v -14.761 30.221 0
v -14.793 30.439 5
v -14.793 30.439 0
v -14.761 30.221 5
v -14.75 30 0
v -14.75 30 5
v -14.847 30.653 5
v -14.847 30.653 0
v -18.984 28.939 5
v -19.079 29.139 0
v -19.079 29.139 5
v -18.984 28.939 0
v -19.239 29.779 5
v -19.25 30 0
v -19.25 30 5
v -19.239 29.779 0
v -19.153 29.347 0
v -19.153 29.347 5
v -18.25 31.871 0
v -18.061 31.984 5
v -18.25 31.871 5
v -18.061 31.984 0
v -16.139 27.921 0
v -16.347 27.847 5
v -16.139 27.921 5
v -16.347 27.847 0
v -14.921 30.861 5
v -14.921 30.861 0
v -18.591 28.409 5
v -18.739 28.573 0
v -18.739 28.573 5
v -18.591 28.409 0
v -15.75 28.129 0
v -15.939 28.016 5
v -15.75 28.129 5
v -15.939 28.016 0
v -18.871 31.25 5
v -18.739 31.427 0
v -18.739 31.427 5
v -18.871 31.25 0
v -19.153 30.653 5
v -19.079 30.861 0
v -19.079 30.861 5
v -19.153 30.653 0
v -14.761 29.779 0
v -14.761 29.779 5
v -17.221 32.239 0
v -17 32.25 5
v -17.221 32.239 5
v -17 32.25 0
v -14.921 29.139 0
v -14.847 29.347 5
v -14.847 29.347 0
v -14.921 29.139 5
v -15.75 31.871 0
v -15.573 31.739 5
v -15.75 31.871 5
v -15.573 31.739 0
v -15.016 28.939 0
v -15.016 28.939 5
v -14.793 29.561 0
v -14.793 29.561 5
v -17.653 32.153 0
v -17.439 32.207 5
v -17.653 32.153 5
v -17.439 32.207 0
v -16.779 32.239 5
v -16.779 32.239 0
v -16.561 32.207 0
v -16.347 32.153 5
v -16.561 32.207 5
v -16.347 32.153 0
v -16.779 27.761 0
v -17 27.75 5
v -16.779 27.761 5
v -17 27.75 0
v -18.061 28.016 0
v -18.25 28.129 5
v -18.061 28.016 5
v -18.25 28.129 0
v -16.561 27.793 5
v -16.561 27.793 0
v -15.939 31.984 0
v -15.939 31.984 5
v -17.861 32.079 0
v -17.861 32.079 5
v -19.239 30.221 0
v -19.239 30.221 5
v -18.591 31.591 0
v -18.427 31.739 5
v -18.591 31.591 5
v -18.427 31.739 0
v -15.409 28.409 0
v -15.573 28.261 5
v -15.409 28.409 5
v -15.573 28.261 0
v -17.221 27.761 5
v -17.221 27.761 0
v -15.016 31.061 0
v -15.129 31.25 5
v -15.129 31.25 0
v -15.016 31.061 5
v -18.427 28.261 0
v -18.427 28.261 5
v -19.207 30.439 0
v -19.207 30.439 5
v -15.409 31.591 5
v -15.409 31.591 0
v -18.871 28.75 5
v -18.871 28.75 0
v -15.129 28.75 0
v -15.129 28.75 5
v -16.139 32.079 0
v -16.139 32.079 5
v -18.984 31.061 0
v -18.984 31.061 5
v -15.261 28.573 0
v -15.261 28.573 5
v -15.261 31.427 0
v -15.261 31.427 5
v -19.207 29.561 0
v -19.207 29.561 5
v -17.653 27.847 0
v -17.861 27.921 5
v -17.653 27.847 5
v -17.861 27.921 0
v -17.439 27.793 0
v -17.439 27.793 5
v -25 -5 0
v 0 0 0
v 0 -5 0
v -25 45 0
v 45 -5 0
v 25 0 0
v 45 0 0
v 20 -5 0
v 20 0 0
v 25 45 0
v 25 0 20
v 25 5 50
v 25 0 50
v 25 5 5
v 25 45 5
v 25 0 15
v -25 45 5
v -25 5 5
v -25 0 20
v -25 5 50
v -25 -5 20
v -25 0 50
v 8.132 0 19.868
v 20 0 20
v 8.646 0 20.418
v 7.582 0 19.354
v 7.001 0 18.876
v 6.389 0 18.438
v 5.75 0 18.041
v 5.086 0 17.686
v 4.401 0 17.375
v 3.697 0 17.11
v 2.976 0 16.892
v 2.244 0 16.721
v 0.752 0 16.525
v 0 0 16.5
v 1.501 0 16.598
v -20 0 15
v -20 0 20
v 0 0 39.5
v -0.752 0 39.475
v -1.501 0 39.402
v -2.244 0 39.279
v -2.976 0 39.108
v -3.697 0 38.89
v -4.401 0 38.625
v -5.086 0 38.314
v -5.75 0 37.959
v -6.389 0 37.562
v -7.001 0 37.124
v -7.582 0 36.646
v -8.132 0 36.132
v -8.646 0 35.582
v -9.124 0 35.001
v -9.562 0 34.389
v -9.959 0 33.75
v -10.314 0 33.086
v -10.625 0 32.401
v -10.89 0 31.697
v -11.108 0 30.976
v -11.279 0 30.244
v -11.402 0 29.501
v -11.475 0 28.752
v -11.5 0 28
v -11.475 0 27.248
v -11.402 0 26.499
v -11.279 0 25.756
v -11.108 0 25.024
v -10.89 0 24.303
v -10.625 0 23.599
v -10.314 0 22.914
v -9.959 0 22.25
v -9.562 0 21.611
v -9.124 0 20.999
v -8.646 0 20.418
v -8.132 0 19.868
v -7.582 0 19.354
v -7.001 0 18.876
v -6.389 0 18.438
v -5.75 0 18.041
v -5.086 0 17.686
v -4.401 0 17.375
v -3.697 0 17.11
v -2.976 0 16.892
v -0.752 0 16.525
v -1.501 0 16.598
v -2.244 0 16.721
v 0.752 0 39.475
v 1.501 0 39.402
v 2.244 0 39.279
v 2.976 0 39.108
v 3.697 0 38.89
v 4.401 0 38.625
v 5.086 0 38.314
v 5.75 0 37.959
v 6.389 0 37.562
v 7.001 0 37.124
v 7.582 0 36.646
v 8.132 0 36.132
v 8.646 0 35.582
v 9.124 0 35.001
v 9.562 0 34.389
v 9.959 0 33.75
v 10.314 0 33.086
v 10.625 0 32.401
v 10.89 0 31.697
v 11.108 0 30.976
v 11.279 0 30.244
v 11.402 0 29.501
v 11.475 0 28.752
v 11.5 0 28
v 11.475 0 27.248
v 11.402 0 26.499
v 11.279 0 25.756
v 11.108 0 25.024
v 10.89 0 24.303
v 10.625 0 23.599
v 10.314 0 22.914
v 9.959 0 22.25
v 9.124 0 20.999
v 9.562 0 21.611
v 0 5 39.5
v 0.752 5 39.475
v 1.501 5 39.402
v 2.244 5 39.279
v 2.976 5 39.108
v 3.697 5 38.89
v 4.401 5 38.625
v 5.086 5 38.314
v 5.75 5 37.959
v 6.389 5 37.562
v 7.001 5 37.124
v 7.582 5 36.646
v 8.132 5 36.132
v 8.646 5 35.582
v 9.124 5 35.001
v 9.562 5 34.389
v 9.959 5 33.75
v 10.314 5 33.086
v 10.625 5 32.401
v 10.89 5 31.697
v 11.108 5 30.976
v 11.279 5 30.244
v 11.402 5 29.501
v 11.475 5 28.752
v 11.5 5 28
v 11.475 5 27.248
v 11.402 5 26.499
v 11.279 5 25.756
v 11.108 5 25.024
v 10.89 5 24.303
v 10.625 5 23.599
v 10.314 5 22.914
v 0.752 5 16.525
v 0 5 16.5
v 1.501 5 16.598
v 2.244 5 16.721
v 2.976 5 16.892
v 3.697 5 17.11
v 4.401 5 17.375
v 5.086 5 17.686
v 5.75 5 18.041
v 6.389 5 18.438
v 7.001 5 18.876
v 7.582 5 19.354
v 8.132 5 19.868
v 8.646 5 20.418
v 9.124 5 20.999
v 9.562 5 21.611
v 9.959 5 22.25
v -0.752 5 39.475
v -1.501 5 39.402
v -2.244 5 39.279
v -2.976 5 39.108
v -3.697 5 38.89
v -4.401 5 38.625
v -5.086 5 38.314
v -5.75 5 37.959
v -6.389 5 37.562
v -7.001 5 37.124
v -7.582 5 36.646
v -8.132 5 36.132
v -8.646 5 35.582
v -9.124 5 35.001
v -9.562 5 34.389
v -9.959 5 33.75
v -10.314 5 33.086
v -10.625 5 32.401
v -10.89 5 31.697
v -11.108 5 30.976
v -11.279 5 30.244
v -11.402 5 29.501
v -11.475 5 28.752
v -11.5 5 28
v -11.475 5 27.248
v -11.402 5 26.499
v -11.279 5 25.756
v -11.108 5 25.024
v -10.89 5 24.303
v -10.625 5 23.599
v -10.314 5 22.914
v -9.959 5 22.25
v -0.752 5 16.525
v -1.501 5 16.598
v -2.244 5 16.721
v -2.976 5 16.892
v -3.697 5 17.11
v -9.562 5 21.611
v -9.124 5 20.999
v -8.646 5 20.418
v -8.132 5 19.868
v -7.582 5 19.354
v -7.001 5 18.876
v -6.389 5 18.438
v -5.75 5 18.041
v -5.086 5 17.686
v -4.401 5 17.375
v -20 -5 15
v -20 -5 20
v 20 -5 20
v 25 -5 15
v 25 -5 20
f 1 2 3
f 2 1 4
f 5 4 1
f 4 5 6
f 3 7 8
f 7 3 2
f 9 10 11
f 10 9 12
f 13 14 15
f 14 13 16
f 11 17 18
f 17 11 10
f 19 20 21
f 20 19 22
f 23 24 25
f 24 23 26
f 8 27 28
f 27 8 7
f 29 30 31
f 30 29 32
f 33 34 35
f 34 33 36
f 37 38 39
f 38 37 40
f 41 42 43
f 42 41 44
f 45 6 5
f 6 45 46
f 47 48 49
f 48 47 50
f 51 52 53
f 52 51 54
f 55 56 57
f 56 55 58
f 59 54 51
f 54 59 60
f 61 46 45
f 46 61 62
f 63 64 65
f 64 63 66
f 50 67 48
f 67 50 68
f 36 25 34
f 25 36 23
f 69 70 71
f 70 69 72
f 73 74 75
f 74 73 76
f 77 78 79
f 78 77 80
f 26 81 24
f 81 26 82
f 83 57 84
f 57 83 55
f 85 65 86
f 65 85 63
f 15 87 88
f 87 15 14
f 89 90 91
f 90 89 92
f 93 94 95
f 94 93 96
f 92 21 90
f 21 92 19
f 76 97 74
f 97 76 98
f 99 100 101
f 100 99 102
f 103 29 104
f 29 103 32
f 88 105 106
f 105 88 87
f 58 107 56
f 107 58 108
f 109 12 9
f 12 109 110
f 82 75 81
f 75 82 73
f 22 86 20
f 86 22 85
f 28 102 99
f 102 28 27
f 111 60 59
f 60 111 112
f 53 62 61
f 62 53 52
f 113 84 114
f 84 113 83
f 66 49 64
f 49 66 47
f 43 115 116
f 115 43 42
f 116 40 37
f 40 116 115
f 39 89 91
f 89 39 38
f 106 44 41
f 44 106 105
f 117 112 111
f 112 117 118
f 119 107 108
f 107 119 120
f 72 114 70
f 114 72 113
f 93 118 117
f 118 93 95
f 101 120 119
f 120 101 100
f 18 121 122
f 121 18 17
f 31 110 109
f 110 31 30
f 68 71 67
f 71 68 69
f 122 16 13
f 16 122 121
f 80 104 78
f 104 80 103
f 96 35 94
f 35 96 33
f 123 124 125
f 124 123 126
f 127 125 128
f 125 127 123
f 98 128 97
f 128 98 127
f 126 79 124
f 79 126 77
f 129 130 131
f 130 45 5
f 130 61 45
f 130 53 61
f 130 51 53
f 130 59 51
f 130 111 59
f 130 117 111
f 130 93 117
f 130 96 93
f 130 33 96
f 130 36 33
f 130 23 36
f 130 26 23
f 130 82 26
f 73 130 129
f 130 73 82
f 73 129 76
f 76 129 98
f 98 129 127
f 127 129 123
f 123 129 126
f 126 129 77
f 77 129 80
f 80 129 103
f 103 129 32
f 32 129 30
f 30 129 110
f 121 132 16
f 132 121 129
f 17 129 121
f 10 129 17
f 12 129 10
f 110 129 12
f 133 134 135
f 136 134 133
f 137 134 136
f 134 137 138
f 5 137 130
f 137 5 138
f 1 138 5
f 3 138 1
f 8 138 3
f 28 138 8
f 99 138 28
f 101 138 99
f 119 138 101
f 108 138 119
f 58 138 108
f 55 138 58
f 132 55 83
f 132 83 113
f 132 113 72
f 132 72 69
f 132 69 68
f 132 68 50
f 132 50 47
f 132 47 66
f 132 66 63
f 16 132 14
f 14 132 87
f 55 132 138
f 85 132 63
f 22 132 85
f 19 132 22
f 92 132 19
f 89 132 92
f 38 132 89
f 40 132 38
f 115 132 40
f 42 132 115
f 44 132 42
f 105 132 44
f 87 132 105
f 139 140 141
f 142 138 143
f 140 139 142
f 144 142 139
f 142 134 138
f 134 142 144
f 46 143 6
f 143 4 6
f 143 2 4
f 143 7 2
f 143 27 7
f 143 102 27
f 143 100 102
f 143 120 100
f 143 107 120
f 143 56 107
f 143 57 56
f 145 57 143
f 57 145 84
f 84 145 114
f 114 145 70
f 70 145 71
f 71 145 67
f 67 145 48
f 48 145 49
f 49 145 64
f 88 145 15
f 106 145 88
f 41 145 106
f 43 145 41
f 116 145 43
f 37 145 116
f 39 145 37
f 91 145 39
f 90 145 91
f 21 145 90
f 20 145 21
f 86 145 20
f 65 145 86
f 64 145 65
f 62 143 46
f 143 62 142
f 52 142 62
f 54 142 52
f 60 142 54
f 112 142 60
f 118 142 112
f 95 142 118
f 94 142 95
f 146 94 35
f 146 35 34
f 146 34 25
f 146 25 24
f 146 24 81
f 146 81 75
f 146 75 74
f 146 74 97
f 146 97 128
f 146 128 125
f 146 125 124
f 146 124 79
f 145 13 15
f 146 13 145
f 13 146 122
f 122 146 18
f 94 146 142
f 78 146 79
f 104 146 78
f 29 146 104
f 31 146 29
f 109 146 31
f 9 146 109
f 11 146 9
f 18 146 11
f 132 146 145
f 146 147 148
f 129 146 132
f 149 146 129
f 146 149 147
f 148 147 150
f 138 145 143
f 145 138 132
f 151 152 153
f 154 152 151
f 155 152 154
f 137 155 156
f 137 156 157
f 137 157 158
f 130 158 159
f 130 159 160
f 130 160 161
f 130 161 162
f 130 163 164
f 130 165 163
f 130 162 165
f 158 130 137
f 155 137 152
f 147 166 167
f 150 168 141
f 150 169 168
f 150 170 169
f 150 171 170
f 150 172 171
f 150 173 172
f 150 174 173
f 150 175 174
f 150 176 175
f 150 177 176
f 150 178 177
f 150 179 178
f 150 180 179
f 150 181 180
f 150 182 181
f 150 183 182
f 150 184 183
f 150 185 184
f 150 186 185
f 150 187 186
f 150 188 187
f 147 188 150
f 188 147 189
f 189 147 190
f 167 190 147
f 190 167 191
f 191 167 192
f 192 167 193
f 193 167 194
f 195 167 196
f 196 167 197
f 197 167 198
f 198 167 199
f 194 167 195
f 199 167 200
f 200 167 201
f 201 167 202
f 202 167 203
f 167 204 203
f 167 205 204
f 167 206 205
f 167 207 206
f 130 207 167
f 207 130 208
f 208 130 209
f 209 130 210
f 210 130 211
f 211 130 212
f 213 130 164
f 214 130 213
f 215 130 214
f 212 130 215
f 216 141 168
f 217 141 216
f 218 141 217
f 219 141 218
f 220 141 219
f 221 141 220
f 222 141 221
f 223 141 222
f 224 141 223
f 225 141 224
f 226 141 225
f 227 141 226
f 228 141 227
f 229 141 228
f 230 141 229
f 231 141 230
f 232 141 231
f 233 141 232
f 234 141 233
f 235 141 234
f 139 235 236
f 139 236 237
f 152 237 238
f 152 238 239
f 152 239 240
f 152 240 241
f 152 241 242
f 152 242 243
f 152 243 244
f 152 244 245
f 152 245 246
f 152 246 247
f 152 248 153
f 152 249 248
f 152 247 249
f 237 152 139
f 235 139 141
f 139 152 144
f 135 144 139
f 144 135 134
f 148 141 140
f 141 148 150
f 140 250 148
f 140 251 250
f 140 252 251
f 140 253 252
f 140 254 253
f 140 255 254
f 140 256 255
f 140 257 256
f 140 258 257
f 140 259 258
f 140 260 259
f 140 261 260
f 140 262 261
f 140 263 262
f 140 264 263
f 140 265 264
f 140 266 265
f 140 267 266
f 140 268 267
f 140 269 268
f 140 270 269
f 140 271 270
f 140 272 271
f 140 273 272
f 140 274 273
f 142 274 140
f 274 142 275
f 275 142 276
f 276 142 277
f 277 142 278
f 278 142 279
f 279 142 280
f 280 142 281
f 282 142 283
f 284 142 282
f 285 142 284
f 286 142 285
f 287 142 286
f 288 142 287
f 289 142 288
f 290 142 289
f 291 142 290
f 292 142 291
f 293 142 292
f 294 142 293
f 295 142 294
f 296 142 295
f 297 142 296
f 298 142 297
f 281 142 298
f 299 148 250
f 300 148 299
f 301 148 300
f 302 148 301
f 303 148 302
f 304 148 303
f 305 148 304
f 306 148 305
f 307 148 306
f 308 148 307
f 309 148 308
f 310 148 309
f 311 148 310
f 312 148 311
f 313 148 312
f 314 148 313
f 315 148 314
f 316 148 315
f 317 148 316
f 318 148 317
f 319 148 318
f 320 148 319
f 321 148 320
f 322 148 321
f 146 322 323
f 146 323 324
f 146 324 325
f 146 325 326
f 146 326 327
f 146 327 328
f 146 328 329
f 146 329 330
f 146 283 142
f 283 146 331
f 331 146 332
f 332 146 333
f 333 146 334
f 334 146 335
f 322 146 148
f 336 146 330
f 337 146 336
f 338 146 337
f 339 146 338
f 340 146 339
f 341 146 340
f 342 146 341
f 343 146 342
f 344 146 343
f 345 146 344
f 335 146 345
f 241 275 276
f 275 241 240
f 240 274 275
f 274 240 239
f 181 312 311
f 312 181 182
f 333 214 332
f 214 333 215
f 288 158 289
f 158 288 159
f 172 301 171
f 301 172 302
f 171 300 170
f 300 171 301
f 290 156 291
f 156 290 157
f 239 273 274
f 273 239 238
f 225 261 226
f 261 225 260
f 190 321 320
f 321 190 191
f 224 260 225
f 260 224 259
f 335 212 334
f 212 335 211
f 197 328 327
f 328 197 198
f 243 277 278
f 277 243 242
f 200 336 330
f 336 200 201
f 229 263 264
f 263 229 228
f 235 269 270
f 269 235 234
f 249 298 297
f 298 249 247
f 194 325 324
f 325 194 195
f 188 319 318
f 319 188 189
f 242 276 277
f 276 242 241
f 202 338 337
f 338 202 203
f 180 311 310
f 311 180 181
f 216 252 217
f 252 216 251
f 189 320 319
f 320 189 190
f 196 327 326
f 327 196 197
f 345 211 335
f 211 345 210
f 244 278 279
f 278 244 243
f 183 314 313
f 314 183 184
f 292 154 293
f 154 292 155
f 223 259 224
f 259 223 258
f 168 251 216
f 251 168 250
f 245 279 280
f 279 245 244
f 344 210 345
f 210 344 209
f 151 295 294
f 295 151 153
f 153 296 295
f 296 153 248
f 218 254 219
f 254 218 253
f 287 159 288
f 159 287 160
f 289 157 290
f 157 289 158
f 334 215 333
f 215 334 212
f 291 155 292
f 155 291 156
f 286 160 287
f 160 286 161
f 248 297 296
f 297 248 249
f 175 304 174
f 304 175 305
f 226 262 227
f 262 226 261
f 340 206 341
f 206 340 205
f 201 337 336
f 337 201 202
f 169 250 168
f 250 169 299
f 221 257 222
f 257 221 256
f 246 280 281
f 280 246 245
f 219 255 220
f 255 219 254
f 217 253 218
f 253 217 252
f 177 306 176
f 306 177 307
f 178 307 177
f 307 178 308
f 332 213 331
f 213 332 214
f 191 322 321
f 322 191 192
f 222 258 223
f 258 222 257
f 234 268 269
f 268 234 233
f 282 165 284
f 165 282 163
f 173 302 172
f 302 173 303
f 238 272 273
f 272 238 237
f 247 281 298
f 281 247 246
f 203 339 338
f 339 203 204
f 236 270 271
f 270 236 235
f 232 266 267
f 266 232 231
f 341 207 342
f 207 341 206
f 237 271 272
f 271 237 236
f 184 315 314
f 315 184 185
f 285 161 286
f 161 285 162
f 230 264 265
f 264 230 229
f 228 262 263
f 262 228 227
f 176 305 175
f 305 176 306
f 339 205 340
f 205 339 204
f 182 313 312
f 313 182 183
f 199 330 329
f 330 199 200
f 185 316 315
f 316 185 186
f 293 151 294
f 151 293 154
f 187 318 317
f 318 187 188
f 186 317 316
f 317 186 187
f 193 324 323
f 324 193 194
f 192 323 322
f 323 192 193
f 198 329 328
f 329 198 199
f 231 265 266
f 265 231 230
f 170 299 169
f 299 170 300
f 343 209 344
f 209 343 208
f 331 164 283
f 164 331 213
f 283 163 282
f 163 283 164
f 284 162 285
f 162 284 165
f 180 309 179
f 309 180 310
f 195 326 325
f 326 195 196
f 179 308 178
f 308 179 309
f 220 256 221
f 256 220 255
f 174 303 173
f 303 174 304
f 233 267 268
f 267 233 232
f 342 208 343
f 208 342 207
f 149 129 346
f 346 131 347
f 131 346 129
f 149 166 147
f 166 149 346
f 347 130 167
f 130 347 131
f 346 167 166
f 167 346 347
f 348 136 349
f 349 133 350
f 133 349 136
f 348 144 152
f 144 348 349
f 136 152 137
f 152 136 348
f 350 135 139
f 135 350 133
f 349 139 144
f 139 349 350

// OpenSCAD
// L-shaped mounting bracket for NEMA 17 stepper motor
// Print orientation: base plate on bed, motor plate building up in +Z

// ---------------- Parameters ----------------
plate_x       = 25;    // base plate half-width (X)
plate_y       = 45;    // base plate length (Y)
plate_t       = 5;     // base plate thickness (Z)

motor_h       = 50;    // motor plate height (Z)
motor_w       = 5;     // motor plate thickness (Y)

boss_d        = 23;    // motor boss hole diameter
boss_x        = 0;     // boss hole centre X
boss_z        = 28;    // boss hole centre Z

screw_d       = 3.4;   // M3 screw hole diameter
screw_pattern = 31;    // square pitch for screw holes
screw_count   = 4;     // number of screw holes

gusset_t      = 5;     // gusset thickness (X)
gusset_leg    = 20;    // right-triangle leg length (Y and Z)
gusset_x      = [-25, -20, 20, 25]; // gusset X positions (flush edges)

eps           = 0.5;   // cutter overshoot past faces

$fn = 96;

// ---------------- Model ----------------
union() {
    // Base plate with M4 through-holes
    difference() {
        translate([-plate_x, 0, 0])
            cube([plate_x * 2, plate_y, plate_t]);
        for (h = [plate_t + eps, plate_t + 2 * eps])
            translate([-17, 30, 0])
                cylinder(d = 4.5, h = h, $fn = 64);
    }

    // Vertical motor plate with boss hole and M3 screw holes
    difference() {
        translate([-plate_x, 0, 0])
            cube([plate_x * 2, motor_w, motor_h]);
        translate([boss_x, -eps, boss_z])
            rotate([-90, 0, 0])
                cylinder(d = boss_d, h = motor_w + 2 * eps, $fn = 96);
        for (i = [0 : screw_count - 1]) {
            a = atan2(sin(i * 90), cos(i * 90));
            translate([boss_x, motor_w / 2 - screw_pattern / 2, boss_z + a * eps])
                rotate([0, 90, i * 90])
                    cylinder(d = screw_d, h = motor_w + 2 * eps, $fn = 64);
        }
    }

    // Triangular gussets flush with left and right edges
    for (gx = gusset_x)
        translate([gx, 0, 0])
            rotate([90, 0, 0])
                linear_extrude(height = gusset_t)
                    polygon(points = [[0, 0], [gusset_leg, 0], [0, gusset_leg]]);
}
